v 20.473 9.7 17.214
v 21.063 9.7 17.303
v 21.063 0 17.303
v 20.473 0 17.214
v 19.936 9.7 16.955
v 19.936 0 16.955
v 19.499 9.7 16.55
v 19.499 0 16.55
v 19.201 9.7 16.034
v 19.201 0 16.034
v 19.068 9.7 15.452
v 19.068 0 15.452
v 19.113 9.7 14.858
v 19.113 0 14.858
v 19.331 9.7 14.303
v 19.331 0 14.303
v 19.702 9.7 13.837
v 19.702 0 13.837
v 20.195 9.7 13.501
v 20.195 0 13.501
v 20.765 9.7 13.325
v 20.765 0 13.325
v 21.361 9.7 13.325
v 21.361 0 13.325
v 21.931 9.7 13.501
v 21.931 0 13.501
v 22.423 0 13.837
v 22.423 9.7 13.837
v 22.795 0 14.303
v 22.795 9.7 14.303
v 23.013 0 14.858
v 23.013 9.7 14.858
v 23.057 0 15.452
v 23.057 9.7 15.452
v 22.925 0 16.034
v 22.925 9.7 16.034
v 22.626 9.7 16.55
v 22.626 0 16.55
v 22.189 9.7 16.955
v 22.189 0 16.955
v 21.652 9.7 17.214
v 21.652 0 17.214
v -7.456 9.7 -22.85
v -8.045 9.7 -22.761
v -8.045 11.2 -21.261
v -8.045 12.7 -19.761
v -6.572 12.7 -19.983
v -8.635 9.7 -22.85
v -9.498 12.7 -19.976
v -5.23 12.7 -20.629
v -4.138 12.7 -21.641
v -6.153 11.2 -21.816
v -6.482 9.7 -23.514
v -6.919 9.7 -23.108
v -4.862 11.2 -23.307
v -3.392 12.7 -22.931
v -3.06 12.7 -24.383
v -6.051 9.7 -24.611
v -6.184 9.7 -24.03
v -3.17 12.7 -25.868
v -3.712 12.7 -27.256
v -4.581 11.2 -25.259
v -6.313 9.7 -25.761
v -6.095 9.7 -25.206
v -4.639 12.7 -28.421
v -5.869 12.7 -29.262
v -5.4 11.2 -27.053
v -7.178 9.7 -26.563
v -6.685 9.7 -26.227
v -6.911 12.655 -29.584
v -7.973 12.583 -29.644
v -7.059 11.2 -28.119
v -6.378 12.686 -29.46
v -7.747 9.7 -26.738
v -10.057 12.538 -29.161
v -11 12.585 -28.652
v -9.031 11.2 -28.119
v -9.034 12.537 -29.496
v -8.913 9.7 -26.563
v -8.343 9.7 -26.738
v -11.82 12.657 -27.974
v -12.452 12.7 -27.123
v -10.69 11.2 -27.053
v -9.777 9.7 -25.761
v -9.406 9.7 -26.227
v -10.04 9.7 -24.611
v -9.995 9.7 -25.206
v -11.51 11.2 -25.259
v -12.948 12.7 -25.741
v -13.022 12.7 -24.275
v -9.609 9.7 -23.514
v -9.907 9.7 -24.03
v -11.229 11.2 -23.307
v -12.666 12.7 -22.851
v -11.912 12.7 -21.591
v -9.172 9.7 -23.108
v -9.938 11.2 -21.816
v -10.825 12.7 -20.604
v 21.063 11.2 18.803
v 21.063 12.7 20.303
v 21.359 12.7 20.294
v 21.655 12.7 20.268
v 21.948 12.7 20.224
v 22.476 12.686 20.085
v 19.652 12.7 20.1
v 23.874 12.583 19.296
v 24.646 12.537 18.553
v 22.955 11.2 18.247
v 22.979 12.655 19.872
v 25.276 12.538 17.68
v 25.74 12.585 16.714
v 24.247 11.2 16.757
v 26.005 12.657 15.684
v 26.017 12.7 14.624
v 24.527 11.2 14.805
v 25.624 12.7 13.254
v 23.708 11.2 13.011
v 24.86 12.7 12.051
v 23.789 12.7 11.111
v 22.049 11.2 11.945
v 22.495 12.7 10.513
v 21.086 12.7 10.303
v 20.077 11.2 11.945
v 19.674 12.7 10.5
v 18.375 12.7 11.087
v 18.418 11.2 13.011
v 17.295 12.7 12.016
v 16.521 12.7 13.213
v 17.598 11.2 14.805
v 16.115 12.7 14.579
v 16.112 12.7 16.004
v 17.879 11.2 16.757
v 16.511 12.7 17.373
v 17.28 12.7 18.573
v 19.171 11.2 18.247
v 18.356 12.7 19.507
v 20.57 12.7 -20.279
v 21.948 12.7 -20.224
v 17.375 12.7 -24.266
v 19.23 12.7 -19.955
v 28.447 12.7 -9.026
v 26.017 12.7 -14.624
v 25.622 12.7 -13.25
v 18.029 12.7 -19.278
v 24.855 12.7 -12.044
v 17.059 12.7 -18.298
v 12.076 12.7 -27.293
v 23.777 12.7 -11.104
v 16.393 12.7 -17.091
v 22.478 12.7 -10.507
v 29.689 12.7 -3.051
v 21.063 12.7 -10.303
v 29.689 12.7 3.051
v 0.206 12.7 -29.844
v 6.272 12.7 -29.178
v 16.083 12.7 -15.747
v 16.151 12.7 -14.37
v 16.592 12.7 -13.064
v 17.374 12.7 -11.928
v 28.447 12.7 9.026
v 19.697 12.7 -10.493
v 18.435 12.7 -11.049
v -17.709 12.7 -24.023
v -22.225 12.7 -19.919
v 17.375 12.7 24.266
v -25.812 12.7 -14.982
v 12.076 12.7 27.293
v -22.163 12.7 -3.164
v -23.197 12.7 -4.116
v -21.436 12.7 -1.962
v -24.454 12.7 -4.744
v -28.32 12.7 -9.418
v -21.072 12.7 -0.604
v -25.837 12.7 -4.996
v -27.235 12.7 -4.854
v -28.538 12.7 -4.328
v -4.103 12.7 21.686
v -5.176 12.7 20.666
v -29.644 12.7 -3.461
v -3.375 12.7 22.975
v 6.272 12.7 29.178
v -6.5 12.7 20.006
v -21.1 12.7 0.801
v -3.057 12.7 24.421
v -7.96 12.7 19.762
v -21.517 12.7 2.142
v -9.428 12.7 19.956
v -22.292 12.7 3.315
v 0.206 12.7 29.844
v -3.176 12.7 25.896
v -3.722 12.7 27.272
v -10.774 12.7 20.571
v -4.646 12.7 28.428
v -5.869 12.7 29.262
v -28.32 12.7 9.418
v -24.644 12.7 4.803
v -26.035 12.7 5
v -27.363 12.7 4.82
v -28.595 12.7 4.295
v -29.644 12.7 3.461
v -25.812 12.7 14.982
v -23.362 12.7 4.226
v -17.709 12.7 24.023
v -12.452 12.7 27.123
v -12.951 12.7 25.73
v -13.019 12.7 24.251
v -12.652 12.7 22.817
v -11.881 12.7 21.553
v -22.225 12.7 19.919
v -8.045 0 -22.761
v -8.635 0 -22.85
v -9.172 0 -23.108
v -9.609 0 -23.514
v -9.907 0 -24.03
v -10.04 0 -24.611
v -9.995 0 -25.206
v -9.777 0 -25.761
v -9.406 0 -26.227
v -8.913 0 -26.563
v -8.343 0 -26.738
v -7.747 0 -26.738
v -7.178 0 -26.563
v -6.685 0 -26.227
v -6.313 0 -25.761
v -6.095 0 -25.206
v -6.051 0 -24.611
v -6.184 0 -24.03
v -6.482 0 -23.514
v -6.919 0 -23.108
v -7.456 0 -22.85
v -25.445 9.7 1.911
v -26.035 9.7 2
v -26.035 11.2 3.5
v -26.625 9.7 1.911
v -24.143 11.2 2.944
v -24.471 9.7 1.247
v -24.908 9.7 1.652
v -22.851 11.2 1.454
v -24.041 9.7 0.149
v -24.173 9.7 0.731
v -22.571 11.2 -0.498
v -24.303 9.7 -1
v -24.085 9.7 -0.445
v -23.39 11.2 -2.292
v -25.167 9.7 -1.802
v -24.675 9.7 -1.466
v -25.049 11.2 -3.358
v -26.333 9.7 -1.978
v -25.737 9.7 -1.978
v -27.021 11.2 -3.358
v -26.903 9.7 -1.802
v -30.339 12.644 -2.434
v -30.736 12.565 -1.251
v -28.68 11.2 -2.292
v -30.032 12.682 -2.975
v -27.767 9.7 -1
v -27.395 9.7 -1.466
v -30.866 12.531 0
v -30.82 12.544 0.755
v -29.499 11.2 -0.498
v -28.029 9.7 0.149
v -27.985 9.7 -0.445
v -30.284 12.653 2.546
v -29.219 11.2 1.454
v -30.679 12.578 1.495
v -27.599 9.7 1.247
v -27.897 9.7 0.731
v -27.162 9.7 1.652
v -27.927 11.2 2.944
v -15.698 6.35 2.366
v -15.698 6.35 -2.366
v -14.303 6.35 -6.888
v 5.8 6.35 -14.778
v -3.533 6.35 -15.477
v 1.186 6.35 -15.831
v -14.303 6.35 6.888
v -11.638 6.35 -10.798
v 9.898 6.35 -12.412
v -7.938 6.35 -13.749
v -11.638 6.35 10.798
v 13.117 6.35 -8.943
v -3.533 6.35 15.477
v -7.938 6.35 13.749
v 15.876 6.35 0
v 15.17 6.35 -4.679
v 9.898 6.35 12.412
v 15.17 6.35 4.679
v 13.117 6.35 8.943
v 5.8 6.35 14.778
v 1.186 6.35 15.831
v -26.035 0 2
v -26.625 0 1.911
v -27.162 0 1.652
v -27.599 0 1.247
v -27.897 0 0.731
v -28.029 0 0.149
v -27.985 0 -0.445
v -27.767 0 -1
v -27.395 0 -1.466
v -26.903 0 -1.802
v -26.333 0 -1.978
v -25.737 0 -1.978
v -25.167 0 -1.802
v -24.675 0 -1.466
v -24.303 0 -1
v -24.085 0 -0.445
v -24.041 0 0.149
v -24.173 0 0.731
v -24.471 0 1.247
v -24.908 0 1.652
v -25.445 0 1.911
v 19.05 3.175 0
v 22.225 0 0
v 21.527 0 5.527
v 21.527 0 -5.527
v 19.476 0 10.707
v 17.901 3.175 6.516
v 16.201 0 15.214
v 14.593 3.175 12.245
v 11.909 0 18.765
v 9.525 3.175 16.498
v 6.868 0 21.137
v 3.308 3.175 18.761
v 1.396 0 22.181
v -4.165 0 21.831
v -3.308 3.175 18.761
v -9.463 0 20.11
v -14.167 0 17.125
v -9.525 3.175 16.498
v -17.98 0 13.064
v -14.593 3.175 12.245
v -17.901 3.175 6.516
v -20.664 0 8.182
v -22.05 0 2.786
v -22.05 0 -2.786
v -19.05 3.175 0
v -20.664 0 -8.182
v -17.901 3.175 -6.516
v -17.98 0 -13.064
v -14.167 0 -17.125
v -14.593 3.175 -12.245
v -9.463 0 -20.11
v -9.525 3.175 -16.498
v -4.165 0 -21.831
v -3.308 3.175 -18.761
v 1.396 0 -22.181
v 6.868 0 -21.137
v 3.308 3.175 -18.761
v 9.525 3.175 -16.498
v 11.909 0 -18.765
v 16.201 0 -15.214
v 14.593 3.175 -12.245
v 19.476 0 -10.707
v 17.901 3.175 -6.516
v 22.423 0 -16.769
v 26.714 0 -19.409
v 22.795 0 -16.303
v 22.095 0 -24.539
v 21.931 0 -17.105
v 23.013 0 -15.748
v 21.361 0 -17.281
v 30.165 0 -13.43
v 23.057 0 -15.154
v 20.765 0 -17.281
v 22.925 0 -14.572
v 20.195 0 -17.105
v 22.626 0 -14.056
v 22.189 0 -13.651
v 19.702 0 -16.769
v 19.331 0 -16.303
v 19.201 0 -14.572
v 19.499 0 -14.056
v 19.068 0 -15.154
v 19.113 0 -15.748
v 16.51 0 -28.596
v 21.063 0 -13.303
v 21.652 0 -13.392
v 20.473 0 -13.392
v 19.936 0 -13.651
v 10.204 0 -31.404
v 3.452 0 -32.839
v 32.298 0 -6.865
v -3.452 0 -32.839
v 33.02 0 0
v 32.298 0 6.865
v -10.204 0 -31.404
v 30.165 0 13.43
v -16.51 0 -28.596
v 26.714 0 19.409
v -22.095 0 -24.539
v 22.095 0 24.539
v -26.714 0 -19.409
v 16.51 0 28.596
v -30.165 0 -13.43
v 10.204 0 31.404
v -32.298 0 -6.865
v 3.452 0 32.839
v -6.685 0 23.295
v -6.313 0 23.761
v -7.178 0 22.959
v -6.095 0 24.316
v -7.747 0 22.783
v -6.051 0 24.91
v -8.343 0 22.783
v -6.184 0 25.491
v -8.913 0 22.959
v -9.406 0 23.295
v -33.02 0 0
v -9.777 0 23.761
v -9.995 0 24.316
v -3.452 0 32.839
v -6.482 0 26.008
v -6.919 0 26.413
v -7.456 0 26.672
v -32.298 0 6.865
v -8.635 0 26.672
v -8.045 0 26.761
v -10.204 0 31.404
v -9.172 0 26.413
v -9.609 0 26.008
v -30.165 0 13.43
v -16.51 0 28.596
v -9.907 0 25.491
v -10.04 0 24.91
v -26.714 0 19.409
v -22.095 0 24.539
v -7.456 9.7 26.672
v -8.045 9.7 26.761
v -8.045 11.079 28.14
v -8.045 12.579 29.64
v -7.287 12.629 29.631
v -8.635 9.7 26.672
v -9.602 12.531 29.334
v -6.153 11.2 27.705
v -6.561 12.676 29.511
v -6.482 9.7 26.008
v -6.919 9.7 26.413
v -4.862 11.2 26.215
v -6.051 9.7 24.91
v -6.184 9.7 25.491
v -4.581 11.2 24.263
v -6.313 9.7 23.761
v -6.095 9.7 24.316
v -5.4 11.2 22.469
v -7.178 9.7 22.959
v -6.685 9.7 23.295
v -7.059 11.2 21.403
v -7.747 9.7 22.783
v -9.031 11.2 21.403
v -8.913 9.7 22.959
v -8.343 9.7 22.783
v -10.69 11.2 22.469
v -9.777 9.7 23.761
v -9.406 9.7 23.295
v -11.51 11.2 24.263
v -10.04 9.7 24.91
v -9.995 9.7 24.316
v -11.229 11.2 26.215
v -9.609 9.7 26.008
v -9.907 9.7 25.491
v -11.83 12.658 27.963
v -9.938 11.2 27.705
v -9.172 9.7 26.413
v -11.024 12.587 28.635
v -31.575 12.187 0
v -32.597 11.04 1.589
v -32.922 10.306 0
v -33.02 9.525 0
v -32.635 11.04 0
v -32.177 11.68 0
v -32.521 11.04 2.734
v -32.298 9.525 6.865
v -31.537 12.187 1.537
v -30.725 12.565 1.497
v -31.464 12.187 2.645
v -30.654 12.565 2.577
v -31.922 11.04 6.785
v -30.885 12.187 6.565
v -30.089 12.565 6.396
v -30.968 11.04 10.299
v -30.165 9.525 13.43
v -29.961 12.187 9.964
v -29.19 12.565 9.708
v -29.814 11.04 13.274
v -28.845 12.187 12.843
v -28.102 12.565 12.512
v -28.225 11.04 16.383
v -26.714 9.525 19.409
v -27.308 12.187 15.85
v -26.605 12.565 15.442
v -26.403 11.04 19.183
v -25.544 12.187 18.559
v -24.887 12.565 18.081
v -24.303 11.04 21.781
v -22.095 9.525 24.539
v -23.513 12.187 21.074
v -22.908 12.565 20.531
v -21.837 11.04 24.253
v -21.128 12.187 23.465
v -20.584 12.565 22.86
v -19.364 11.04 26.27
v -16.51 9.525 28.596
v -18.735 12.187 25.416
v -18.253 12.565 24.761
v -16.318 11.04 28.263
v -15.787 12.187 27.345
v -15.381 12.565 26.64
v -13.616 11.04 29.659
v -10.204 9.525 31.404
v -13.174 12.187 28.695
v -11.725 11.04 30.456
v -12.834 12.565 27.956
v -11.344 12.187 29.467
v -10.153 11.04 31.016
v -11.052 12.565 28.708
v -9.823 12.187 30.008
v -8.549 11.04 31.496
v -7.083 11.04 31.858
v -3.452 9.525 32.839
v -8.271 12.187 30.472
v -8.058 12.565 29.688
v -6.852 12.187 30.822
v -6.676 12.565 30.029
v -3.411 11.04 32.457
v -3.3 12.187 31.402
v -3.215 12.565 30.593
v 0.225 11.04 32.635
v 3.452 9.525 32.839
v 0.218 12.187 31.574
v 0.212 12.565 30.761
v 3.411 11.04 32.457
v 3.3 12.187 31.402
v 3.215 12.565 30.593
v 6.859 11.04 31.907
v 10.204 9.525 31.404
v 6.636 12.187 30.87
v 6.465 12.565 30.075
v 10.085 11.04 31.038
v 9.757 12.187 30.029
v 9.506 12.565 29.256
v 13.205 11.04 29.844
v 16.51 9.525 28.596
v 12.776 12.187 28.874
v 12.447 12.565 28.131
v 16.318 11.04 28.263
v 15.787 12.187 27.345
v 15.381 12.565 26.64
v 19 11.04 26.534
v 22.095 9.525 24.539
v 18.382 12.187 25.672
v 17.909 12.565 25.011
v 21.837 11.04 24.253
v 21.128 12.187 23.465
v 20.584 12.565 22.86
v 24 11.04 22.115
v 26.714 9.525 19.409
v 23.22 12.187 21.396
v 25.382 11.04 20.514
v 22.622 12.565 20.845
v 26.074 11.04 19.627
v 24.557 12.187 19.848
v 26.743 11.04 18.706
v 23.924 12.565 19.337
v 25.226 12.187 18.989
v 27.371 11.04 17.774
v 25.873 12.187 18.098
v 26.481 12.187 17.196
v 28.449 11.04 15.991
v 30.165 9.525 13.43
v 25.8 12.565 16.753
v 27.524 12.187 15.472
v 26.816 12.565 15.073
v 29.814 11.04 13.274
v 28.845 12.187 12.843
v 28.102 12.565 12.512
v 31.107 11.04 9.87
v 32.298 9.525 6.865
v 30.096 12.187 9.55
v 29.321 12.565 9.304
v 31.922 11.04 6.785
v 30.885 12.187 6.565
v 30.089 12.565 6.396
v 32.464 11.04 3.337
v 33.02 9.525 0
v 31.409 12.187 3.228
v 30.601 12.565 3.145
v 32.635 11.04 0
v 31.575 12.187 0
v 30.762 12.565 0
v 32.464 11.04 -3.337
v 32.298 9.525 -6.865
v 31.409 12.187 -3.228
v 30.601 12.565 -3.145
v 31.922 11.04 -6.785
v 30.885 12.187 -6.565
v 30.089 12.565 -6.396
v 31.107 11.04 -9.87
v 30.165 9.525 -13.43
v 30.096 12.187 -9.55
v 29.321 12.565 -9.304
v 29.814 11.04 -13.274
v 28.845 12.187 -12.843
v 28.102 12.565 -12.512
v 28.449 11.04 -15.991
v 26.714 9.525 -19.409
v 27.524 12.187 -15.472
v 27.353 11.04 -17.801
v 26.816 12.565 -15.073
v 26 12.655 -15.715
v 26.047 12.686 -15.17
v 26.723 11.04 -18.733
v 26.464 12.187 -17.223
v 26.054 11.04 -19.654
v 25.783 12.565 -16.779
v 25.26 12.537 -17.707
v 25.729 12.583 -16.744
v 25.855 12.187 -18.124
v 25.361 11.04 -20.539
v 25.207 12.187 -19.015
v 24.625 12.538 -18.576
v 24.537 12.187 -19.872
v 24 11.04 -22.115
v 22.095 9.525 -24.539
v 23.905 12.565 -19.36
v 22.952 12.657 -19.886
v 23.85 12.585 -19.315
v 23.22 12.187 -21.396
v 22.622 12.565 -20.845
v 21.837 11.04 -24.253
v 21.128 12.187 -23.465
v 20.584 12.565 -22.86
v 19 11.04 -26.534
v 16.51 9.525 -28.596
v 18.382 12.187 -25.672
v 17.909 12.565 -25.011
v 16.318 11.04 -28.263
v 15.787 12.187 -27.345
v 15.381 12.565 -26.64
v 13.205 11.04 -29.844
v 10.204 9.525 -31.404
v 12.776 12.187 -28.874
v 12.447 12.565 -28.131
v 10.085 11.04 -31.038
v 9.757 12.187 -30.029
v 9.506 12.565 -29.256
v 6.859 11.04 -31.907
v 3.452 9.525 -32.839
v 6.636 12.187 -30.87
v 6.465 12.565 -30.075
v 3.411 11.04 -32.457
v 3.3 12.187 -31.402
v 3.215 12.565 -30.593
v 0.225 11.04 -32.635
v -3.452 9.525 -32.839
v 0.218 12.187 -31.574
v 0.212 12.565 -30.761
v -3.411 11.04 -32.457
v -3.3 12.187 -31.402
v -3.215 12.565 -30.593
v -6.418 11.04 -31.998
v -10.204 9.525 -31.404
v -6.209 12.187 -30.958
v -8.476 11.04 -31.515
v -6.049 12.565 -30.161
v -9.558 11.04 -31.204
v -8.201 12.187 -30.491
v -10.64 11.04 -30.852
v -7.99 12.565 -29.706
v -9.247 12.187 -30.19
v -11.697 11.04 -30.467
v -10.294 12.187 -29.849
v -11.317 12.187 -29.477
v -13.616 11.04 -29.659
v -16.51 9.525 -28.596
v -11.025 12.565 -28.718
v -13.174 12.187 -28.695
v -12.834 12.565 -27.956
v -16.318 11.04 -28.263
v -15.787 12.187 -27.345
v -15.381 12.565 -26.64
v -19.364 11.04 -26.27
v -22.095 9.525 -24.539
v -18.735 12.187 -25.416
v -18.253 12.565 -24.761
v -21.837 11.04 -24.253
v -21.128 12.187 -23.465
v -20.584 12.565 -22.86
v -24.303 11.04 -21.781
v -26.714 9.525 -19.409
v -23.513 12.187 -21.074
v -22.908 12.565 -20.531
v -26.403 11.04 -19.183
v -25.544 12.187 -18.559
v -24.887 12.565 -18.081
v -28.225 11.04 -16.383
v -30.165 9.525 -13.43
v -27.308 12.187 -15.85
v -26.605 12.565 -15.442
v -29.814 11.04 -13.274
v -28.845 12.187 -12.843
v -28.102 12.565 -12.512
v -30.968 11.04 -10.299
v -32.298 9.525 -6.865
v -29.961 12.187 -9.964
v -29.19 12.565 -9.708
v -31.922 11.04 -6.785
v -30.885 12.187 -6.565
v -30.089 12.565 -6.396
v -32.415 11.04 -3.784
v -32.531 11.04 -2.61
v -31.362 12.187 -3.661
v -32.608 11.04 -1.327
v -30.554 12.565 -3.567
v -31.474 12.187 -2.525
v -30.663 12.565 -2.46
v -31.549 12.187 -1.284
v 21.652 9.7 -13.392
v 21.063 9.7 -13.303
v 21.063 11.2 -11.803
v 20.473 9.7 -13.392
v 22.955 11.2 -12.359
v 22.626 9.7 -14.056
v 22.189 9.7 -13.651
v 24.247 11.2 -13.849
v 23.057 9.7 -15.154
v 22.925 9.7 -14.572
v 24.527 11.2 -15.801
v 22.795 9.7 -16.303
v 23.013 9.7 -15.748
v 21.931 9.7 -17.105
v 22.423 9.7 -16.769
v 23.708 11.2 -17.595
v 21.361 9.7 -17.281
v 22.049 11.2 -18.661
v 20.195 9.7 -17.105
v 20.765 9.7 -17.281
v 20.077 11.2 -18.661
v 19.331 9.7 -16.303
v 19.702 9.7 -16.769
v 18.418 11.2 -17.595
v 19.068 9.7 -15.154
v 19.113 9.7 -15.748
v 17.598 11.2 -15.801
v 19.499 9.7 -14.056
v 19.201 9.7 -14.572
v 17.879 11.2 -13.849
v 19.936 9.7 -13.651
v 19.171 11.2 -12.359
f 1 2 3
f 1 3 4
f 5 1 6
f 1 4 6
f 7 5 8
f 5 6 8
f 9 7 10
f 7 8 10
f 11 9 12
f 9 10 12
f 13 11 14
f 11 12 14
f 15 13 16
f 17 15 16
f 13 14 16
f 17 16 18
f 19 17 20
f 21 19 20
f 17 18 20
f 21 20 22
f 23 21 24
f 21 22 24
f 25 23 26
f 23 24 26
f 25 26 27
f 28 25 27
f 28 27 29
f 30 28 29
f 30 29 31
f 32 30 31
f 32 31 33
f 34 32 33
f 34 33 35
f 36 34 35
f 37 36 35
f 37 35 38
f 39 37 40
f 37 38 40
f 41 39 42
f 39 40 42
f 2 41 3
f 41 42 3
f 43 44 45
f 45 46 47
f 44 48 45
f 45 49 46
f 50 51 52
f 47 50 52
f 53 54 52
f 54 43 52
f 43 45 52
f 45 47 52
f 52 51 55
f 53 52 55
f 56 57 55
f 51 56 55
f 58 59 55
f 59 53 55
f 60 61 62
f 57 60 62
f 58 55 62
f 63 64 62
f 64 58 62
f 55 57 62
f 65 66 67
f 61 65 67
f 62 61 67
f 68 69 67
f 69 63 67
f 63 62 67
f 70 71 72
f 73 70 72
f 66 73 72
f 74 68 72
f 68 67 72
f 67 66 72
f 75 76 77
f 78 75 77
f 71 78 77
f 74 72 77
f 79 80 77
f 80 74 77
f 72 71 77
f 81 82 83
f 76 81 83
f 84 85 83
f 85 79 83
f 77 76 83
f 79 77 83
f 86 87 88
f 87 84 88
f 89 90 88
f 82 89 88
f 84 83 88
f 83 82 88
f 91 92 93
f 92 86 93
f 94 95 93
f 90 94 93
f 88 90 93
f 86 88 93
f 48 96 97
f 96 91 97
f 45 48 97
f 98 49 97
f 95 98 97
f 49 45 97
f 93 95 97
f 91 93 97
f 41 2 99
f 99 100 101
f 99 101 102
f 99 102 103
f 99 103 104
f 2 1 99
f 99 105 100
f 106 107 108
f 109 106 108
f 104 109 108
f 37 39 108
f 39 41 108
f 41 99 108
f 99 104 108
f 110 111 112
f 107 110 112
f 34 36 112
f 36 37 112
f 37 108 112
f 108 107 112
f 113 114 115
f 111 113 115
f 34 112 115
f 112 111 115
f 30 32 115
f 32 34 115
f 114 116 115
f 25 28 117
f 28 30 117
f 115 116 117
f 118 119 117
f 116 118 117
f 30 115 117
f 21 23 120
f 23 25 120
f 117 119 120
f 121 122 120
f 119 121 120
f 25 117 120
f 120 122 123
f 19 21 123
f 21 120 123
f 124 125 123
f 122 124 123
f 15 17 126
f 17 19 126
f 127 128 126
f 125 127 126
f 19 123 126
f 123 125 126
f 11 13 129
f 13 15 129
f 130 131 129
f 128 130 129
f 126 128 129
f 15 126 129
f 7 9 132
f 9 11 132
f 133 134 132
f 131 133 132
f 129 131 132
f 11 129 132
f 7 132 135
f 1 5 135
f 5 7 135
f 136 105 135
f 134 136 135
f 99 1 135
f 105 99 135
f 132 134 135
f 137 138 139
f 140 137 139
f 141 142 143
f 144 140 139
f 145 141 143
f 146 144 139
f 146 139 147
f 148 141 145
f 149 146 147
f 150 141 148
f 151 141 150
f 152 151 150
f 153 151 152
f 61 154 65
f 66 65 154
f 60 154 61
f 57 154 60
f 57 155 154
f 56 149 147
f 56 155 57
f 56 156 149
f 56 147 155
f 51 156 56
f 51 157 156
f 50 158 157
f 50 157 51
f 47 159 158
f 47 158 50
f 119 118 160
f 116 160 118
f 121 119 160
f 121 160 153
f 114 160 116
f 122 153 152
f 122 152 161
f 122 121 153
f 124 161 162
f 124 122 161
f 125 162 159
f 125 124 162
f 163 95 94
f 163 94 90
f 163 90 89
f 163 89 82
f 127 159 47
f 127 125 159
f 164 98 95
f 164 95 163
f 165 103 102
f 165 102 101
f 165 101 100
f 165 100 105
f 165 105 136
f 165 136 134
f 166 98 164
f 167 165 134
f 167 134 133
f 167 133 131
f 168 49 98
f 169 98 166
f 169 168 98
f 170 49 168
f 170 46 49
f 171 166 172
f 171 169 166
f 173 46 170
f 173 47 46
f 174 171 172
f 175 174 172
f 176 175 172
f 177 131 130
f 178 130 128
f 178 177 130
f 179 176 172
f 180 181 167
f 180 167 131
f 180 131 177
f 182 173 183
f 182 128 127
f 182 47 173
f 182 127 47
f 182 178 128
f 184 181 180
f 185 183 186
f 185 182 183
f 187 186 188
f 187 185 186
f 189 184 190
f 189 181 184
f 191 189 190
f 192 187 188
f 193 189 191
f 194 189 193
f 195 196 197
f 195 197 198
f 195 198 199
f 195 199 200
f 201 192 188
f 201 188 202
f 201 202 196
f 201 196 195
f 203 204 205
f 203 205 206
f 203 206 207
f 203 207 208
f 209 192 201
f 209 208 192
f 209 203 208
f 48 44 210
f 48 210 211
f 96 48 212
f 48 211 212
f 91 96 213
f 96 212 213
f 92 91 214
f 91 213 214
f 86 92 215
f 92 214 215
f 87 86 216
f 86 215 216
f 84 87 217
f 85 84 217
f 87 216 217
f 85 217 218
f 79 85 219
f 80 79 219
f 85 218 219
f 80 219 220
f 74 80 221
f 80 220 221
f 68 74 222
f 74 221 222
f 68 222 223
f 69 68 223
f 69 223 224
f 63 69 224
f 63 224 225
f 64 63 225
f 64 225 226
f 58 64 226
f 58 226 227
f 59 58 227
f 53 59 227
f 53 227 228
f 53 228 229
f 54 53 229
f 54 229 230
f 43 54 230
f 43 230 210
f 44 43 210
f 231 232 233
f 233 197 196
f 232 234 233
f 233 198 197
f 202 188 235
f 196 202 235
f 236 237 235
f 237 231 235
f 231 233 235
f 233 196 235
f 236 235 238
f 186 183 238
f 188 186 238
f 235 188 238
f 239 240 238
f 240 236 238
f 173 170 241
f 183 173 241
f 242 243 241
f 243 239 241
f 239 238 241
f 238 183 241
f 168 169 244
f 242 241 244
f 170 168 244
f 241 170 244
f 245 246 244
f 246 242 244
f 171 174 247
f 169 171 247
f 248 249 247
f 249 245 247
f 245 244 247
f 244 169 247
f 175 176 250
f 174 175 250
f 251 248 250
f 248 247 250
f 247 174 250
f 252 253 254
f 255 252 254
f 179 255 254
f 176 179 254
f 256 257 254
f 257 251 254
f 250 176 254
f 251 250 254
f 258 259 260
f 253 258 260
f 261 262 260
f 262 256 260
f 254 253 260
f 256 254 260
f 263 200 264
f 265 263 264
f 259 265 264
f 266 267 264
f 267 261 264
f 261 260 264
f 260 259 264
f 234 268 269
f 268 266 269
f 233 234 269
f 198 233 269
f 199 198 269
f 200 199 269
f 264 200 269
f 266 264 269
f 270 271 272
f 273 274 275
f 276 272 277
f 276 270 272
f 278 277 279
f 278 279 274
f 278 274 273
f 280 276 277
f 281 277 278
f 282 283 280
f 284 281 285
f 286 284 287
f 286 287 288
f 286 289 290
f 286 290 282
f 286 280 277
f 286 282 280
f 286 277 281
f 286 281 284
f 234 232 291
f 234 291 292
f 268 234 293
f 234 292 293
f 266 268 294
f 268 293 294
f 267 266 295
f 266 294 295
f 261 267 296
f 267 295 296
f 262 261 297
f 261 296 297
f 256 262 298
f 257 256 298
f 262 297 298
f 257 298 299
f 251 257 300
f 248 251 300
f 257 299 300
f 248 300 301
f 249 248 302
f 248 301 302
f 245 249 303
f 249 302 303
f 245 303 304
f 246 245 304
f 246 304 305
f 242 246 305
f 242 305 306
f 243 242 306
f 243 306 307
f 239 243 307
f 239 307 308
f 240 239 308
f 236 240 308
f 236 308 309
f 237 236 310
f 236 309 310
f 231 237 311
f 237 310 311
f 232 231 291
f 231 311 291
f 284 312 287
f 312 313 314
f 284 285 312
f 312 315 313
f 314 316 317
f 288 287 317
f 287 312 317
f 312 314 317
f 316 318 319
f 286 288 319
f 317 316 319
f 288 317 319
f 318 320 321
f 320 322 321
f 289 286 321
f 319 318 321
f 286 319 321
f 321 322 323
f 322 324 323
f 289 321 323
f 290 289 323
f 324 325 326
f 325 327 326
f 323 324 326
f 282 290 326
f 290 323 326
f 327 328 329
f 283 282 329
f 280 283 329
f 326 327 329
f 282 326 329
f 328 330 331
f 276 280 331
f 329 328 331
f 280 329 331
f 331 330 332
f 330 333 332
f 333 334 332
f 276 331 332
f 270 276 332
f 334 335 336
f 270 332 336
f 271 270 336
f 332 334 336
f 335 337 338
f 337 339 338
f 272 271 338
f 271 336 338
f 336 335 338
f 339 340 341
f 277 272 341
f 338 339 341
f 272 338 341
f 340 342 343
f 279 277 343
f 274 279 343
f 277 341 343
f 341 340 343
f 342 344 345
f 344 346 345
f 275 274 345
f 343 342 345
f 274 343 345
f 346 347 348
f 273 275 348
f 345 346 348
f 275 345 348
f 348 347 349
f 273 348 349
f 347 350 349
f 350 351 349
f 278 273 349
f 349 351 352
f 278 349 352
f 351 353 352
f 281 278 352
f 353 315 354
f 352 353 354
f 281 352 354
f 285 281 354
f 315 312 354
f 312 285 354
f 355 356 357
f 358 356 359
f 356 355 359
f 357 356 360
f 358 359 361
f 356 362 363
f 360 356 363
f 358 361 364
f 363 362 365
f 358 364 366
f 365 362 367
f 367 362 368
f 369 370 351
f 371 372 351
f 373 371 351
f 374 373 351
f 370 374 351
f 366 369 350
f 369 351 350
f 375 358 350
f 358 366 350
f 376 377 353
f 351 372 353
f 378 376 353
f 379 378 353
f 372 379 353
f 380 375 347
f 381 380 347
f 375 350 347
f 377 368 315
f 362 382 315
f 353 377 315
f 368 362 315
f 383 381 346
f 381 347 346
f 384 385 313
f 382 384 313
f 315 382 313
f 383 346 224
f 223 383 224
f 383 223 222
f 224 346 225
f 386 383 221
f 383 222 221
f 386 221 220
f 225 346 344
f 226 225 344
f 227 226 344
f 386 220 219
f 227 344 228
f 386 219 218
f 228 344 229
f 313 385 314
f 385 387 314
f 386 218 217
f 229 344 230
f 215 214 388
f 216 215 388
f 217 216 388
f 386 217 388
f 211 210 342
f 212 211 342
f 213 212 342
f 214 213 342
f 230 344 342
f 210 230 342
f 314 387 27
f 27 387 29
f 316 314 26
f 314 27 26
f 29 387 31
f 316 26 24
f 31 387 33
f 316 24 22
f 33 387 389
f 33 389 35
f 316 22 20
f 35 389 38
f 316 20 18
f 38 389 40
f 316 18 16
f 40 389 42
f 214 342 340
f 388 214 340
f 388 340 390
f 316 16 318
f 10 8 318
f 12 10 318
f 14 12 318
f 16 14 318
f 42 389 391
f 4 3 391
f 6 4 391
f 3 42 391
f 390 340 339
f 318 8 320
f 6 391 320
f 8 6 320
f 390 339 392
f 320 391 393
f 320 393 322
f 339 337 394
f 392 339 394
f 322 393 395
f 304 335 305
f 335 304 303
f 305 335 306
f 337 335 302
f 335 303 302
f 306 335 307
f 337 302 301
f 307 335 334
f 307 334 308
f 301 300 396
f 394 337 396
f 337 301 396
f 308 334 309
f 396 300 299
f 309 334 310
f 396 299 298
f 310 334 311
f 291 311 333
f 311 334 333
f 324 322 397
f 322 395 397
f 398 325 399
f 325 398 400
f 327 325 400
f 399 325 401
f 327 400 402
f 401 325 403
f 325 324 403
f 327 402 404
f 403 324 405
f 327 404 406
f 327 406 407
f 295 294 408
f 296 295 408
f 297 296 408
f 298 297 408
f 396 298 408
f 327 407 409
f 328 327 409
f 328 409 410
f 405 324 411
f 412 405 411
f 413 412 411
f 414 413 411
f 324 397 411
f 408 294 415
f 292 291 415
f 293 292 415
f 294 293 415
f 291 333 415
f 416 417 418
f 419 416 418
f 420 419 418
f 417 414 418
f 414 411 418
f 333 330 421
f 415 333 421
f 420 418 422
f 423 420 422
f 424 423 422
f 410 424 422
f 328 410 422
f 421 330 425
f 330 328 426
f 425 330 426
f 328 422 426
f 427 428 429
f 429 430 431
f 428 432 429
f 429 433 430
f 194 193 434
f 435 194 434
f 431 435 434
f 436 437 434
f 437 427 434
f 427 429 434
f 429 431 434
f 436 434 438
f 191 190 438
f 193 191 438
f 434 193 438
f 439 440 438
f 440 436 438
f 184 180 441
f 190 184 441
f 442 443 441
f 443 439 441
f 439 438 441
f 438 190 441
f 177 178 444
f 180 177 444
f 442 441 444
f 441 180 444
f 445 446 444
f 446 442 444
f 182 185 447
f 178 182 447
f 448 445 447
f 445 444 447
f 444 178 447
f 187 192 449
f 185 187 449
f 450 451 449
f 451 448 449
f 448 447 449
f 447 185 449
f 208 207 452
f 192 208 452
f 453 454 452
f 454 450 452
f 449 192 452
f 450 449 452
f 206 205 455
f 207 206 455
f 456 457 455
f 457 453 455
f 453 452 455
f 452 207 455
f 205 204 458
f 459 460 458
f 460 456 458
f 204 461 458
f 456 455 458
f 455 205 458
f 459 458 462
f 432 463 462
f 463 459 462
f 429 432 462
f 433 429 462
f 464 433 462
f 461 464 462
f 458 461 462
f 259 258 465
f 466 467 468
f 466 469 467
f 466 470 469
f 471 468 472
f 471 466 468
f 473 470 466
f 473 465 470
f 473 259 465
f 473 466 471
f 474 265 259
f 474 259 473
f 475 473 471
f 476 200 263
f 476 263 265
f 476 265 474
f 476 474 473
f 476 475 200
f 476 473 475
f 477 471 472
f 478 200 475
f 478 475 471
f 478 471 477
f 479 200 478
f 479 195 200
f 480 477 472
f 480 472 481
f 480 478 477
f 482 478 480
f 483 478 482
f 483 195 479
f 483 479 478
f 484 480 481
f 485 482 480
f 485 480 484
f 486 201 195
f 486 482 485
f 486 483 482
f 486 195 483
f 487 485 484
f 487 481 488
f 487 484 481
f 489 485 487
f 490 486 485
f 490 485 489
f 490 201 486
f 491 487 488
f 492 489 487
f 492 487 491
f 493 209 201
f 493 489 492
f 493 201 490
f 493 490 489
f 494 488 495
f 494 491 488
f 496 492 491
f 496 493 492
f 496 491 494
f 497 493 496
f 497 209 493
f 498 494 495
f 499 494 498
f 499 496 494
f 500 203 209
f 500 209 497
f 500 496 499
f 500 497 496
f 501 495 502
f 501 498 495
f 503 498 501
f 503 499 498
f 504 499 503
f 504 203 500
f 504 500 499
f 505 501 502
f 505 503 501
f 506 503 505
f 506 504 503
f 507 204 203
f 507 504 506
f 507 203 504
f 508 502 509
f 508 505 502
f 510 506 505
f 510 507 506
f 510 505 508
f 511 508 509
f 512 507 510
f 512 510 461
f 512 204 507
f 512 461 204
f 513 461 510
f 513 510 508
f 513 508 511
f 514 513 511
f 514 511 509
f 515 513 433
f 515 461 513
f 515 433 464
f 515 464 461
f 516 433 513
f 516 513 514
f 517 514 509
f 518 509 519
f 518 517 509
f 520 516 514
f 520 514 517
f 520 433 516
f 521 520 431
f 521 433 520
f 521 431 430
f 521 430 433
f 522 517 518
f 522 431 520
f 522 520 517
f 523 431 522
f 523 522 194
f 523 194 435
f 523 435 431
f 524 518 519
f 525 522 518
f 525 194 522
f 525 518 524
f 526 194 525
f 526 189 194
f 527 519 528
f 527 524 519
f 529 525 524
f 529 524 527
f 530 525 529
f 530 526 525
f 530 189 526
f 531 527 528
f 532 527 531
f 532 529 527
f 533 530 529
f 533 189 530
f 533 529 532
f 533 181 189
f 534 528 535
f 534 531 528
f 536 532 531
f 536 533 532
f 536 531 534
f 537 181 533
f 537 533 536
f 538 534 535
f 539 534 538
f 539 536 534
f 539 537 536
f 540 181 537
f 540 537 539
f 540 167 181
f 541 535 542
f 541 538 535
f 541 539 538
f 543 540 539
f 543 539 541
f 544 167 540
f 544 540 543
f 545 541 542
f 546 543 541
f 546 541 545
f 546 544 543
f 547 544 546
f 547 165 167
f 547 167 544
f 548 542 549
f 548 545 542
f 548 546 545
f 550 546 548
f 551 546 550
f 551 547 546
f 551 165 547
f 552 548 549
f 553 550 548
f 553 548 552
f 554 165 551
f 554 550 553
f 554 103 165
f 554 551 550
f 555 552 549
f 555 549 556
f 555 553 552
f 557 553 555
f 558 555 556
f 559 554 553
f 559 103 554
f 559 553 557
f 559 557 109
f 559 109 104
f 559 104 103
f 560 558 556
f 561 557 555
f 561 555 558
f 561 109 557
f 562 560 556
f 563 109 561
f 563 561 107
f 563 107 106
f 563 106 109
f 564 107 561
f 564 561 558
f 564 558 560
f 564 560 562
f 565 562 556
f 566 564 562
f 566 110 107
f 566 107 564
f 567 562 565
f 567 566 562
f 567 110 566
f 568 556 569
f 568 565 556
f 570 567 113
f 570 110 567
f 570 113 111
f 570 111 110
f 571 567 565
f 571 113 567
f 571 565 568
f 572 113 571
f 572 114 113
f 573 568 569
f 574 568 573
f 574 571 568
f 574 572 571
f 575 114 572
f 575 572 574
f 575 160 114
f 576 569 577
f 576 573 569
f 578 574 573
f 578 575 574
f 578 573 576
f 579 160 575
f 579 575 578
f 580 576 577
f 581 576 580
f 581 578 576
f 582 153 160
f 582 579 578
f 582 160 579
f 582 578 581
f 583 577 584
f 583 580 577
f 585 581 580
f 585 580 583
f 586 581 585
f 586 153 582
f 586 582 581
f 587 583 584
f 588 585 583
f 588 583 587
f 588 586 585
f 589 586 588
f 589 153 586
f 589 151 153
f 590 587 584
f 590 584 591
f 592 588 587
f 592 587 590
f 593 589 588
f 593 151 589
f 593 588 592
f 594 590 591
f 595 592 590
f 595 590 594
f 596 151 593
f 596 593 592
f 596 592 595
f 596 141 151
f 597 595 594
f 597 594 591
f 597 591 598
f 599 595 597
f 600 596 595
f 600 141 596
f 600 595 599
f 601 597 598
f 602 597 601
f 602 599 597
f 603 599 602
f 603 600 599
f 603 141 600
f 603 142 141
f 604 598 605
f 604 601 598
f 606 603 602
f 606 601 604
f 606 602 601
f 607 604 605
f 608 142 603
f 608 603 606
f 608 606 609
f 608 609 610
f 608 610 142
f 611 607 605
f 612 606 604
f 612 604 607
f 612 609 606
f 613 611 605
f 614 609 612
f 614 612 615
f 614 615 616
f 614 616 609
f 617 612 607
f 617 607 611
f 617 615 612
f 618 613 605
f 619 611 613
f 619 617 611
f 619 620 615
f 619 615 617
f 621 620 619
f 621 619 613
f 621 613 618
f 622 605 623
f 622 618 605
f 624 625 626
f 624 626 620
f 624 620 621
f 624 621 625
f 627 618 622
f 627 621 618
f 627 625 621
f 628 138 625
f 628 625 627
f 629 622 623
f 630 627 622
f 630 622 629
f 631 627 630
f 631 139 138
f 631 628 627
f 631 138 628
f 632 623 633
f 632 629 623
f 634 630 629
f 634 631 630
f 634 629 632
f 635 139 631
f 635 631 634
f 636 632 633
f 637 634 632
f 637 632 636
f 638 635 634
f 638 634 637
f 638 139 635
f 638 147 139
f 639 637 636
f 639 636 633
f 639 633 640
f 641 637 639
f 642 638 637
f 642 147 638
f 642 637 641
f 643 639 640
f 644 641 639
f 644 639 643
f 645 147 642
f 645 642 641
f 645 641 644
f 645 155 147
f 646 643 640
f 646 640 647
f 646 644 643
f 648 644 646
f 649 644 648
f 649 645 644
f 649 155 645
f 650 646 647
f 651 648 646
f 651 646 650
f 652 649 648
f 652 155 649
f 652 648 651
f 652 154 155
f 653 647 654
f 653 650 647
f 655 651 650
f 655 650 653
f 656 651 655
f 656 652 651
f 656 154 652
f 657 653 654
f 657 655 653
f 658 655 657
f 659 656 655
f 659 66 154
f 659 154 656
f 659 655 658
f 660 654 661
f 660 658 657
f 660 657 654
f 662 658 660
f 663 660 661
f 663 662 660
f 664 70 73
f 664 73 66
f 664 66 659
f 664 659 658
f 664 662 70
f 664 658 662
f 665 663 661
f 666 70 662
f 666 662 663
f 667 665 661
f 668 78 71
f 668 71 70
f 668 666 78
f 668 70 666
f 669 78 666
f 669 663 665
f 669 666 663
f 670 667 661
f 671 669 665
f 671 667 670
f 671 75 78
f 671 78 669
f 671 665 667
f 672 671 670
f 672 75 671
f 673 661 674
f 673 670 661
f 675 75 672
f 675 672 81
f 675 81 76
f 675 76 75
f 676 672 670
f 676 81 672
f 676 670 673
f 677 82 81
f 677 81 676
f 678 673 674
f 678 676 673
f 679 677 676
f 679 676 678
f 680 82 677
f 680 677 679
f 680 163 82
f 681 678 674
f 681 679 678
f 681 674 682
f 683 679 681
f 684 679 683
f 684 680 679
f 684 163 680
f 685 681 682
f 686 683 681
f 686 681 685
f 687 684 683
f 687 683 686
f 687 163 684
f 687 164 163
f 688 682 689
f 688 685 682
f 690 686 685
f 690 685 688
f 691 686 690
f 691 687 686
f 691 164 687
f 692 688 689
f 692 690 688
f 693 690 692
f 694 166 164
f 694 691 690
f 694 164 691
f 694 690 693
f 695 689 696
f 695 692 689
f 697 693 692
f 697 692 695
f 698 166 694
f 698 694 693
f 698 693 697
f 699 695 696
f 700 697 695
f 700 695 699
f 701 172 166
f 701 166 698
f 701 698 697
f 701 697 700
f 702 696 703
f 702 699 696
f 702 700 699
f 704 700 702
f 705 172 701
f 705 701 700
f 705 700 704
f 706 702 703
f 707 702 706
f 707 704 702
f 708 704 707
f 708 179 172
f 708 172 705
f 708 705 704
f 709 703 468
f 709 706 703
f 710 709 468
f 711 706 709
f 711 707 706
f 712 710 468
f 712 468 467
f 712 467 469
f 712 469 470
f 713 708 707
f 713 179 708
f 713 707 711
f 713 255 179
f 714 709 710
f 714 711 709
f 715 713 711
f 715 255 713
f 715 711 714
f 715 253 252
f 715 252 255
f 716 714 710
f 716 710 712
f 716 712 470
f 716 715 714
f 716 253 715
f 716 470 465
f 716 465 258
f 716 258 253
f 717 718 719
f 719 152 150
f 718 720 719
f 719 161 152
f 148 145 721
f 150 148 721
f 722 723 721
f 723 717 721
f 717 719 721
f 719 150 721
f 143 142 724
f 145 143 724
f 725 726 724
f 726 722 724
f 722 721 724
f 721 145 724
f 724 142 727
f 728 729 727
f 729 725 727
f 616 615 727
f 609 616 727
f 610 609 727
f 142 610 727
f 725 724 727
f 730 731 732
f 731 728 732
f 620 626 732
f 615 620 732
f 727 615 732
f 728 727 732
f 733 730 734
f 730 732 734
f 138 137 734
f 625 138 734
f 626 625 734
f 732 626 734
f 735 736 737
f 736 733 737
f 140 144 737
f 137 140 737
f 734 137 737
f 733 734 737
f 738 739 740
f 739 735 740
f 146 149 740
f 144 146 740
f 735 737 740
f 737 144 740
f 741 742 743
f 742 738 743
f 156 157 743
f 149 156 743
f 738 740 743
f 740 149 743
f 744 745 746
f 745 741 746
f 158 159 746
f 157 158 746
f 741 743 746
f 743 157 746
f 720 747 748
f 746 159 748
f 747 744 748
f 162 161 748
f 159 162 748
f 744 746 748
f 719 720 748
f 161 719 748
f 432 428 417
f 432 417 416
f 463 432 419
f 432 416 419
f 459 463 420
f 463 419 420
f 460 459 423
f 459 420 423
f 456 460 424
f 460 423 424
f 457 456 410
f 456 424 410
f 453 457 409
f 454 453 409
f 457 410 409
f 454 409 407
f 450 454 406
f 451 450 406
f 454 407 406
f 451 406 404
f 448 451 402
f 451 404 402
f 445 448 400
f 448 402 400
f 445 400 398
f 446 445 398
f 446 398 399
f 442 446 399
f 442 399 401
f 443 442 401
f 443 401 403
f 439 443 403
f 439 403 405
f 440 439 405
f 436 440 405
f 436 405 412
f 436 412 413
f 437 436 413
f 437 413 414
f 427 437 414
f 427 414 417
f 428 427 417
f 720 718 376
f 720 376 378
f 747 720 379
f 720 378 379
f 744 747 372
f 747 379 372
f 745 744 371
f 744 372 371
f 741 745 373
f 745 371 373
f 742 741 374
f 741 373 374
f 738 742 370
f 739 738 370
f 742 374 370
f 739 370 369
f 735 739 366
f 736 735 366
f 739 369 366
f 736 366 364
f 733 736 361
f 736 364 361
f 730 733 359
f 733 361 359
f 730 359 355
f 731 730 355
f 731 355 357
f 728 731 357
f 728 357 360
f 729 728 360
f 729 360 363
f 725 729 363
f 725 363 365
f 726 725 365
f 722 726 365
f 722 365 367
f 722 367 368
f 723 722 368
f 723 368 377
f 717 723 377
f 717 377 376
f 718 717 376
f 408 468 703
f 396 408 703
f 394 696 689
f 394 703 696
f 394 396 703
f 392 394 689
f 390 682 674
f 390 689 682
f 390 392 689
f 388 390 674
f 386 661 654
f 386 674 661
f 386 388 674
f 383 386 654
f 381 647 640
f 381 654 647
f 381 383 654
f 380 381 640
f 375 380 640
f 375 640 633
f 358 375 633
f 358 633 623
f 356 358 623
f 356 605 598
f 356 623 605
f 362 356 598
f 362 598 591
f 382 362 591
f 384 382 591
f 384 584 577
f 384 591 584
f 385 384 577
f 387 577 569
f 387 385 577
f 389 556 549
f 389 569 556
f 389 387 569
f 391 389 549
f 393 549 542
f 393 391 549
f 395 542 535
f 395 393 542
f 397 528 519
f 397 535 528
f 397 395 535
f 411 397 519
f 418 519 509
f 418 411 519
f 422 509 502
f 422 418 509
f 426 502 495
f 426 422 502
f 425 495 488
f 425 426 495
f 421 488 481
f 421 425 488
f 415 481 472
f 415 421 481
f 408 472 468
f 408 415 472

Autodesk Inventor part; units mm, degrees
ref_plane "YZ Plane" through (0, 0, 0) normal (1, 0, 0) x (0, 1, 0)
ref_plane "XZ Plane" through (0, 0, 0) normal (0, 1, 0) x (-1, 0, 0)
ref_plane "XY Plane" through (0, 0, 0) normal (0, 0, 1) x (1, 0, 0)
sketch "Sketch1" plane through (0, 0, 0) normal (0, 1, 0) x (-1, 0, 0)
  circle A0 centre (0, 0) radius 33.02
  dimension "d0" = 66.04
extrude "Extrusion1" add sketch "Sketch1" along normal blind 12.7
fillet "Fillet1" radius 3.175 1 edges at (33.02, 12.7, 0)
sketch "Sketch2" plane through (0, 12.7, 0) normal (0, 1, 0) x (1, 0, 0)
  line L0 (0, 0) -> (-26.035, 0)
  point P0 (-8.0453, -24.7608)
  point P1 (21.0628, -15.303)
  point P2 (21.0628, 15.303)
  point P3 (-8.0453, 24.7608)
  dimension "d4" = 26.035
  dimension "d7" = 360
hole "Hole1" at (-26.035, 12.7, 0) at (-8.0453, 12.7, 24.7608) at (21.0628, 12.7, 15.303) at (21.0628, 12.7, -15.303) at (-8.0453, 12.7, -24.7608) direction (0, -1, 0) diameter 4 end through all countersink diameter 10 countersink angle 90
sketch "Sketch3" plane through (0, 0, 0) normal (0, -1, 0) x (1, 0, 0)
  circle A0 centre (0, 0) radius 22.225
  dimension "d16" = 44.45
extrude "Extrusion2" cut sketch "Sketch3" against normal blind 6.35
chamfer "Chamfer1" distance 6.35 angle 45 1 edges at (-22.225, 6.35, 0)
properties part number "bearingplate 2"
